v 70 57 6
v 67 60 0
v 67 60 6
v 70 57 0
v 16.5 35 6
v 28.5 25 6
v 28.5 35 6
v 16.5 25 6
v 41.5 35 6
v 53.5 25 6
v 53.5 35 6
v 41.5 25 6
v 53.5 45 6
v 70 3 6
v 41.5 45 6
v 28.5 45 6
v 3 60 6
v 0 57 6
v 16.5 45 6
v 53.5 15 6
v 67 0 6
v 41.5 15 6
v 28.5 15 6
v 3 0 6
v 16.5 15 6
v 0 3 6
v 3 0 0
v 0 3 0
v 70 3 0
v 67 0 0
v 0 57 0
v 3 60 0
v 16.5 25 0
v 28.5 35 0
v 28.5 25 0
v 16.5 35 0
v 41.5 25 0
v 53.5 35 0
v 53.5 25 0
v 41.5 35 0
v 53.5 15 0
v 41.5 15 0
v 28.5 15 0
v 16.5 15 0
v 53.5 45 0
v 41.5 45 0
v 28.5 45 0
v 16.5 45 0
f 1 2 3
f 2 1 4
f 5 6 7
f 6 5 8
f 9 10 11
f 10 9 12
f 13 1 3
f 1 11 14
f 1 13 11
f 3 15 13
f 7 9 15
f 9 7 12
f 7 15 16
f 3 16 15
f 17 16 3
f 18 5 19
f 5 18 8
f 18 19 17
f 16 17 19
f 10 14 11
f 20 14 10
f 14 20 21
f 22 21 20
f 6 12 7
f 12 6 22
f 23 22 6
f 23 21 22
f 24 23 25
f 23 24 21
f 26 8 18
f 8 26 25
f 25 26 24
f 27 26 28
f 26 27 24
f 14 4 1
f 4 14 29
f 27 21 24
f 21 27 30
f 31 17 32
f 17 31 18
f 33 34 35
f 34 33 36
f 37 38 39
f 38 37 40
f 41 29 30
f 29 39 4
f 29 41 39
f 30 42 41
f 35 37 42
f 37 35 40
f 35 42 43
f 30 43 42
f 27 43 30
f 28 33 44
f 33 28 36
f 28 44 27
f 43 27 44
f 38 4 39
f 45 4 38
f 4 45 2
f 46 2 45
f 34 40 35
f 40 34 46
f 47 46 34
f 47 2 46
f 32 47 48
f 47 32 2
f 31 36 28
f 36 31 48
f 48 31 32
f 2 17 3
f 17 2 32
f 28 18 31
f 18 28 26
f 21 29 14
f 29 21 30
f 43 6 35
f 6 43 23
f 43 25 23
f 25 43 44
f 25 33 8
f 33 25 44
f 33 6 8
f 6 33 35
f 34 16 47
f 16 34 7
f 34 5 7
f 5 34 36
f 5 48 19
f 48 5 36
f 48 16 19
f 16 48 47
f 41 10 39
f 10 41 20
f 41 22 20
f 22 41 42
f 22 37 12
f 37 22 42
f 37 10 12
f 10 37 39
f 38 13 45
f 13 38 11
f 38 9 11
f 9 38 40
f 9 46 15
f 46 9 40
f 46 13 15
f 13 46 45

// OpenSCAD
$fn = 32;

// ----------------------------------------------------------------------
// Windowed plate: 4 voids, 70 x 60 x 6 mm
// ----------------------------------------------------------------------

// --- parameters (mm) ---
plate_l = 70;             // plate length, X
plate_w = 60;             // plate width, Y
plate_t = 6;              // plate thickness, Z
edge_margin = 10;         // wall from the plate edge to any window
win_l = 12;               // pocket length
win_w = 10;               // pocket width
pitch_x = 25;             // grid pitch along X
pitch_y = 20;             // grid pitch along Y
depth_1 = 6;              // depth of void 1 (full thickness = through)
depth_2 = 6;              // depth of void 2 (full thickness = through)
depth_3 = 6;              // depth of void 3 (full thickness = through)
depth_4 = 6;              // depth of void 4 (full thickness = through)
corner_c = 3;             // corner chamfer of the plate

profile = [[3, 0], [67, 0], [70, 3], [70, 57], [67, 60], [3, 60], [0, 57], [0, 3]];  // primary outline, 8 points, counter clockwise
void_1 = [[16.5, 15], [28.5, 15], [28.5, 25], [16.5, 25]];  // pocket at grid node 0,0, 4 points
void_2 = [[16.5, 35], [28.5, 35], [28.5, 45], [16.5, 45]];  // pocket at grid node 0,1, 4 points
void_3 = [[41.5, 15], [53.5, 15], [53.5, 25], [41.5, 25]];  // pocket at grid node 1,0, 4 points
void_4 = [[41.5, 35], [53.5, 35], [53.5, 45], [41.5, 45]];  // pocket at grid node 1,1, 4 points

// --- the one profile operation ---
difference() {
  linear_extrude(height = plate_t) polygon(points = profile);
  translate([0, 0, -1])
    linear_extrude(height = plate_t + 2) polygon(points = void_1);
  translate([0, 0, -1])
    linear_extrude(height = plate_t + 2) polygon(points = void_2);
  translate([0, 0, -1])
    linear_extrude(height = plate_t + 2) polygon(points = void_3);
  translate([0, 0, -1])
    linear_extrude(height = plate_t + 2) polygon(points = void_4);
}
